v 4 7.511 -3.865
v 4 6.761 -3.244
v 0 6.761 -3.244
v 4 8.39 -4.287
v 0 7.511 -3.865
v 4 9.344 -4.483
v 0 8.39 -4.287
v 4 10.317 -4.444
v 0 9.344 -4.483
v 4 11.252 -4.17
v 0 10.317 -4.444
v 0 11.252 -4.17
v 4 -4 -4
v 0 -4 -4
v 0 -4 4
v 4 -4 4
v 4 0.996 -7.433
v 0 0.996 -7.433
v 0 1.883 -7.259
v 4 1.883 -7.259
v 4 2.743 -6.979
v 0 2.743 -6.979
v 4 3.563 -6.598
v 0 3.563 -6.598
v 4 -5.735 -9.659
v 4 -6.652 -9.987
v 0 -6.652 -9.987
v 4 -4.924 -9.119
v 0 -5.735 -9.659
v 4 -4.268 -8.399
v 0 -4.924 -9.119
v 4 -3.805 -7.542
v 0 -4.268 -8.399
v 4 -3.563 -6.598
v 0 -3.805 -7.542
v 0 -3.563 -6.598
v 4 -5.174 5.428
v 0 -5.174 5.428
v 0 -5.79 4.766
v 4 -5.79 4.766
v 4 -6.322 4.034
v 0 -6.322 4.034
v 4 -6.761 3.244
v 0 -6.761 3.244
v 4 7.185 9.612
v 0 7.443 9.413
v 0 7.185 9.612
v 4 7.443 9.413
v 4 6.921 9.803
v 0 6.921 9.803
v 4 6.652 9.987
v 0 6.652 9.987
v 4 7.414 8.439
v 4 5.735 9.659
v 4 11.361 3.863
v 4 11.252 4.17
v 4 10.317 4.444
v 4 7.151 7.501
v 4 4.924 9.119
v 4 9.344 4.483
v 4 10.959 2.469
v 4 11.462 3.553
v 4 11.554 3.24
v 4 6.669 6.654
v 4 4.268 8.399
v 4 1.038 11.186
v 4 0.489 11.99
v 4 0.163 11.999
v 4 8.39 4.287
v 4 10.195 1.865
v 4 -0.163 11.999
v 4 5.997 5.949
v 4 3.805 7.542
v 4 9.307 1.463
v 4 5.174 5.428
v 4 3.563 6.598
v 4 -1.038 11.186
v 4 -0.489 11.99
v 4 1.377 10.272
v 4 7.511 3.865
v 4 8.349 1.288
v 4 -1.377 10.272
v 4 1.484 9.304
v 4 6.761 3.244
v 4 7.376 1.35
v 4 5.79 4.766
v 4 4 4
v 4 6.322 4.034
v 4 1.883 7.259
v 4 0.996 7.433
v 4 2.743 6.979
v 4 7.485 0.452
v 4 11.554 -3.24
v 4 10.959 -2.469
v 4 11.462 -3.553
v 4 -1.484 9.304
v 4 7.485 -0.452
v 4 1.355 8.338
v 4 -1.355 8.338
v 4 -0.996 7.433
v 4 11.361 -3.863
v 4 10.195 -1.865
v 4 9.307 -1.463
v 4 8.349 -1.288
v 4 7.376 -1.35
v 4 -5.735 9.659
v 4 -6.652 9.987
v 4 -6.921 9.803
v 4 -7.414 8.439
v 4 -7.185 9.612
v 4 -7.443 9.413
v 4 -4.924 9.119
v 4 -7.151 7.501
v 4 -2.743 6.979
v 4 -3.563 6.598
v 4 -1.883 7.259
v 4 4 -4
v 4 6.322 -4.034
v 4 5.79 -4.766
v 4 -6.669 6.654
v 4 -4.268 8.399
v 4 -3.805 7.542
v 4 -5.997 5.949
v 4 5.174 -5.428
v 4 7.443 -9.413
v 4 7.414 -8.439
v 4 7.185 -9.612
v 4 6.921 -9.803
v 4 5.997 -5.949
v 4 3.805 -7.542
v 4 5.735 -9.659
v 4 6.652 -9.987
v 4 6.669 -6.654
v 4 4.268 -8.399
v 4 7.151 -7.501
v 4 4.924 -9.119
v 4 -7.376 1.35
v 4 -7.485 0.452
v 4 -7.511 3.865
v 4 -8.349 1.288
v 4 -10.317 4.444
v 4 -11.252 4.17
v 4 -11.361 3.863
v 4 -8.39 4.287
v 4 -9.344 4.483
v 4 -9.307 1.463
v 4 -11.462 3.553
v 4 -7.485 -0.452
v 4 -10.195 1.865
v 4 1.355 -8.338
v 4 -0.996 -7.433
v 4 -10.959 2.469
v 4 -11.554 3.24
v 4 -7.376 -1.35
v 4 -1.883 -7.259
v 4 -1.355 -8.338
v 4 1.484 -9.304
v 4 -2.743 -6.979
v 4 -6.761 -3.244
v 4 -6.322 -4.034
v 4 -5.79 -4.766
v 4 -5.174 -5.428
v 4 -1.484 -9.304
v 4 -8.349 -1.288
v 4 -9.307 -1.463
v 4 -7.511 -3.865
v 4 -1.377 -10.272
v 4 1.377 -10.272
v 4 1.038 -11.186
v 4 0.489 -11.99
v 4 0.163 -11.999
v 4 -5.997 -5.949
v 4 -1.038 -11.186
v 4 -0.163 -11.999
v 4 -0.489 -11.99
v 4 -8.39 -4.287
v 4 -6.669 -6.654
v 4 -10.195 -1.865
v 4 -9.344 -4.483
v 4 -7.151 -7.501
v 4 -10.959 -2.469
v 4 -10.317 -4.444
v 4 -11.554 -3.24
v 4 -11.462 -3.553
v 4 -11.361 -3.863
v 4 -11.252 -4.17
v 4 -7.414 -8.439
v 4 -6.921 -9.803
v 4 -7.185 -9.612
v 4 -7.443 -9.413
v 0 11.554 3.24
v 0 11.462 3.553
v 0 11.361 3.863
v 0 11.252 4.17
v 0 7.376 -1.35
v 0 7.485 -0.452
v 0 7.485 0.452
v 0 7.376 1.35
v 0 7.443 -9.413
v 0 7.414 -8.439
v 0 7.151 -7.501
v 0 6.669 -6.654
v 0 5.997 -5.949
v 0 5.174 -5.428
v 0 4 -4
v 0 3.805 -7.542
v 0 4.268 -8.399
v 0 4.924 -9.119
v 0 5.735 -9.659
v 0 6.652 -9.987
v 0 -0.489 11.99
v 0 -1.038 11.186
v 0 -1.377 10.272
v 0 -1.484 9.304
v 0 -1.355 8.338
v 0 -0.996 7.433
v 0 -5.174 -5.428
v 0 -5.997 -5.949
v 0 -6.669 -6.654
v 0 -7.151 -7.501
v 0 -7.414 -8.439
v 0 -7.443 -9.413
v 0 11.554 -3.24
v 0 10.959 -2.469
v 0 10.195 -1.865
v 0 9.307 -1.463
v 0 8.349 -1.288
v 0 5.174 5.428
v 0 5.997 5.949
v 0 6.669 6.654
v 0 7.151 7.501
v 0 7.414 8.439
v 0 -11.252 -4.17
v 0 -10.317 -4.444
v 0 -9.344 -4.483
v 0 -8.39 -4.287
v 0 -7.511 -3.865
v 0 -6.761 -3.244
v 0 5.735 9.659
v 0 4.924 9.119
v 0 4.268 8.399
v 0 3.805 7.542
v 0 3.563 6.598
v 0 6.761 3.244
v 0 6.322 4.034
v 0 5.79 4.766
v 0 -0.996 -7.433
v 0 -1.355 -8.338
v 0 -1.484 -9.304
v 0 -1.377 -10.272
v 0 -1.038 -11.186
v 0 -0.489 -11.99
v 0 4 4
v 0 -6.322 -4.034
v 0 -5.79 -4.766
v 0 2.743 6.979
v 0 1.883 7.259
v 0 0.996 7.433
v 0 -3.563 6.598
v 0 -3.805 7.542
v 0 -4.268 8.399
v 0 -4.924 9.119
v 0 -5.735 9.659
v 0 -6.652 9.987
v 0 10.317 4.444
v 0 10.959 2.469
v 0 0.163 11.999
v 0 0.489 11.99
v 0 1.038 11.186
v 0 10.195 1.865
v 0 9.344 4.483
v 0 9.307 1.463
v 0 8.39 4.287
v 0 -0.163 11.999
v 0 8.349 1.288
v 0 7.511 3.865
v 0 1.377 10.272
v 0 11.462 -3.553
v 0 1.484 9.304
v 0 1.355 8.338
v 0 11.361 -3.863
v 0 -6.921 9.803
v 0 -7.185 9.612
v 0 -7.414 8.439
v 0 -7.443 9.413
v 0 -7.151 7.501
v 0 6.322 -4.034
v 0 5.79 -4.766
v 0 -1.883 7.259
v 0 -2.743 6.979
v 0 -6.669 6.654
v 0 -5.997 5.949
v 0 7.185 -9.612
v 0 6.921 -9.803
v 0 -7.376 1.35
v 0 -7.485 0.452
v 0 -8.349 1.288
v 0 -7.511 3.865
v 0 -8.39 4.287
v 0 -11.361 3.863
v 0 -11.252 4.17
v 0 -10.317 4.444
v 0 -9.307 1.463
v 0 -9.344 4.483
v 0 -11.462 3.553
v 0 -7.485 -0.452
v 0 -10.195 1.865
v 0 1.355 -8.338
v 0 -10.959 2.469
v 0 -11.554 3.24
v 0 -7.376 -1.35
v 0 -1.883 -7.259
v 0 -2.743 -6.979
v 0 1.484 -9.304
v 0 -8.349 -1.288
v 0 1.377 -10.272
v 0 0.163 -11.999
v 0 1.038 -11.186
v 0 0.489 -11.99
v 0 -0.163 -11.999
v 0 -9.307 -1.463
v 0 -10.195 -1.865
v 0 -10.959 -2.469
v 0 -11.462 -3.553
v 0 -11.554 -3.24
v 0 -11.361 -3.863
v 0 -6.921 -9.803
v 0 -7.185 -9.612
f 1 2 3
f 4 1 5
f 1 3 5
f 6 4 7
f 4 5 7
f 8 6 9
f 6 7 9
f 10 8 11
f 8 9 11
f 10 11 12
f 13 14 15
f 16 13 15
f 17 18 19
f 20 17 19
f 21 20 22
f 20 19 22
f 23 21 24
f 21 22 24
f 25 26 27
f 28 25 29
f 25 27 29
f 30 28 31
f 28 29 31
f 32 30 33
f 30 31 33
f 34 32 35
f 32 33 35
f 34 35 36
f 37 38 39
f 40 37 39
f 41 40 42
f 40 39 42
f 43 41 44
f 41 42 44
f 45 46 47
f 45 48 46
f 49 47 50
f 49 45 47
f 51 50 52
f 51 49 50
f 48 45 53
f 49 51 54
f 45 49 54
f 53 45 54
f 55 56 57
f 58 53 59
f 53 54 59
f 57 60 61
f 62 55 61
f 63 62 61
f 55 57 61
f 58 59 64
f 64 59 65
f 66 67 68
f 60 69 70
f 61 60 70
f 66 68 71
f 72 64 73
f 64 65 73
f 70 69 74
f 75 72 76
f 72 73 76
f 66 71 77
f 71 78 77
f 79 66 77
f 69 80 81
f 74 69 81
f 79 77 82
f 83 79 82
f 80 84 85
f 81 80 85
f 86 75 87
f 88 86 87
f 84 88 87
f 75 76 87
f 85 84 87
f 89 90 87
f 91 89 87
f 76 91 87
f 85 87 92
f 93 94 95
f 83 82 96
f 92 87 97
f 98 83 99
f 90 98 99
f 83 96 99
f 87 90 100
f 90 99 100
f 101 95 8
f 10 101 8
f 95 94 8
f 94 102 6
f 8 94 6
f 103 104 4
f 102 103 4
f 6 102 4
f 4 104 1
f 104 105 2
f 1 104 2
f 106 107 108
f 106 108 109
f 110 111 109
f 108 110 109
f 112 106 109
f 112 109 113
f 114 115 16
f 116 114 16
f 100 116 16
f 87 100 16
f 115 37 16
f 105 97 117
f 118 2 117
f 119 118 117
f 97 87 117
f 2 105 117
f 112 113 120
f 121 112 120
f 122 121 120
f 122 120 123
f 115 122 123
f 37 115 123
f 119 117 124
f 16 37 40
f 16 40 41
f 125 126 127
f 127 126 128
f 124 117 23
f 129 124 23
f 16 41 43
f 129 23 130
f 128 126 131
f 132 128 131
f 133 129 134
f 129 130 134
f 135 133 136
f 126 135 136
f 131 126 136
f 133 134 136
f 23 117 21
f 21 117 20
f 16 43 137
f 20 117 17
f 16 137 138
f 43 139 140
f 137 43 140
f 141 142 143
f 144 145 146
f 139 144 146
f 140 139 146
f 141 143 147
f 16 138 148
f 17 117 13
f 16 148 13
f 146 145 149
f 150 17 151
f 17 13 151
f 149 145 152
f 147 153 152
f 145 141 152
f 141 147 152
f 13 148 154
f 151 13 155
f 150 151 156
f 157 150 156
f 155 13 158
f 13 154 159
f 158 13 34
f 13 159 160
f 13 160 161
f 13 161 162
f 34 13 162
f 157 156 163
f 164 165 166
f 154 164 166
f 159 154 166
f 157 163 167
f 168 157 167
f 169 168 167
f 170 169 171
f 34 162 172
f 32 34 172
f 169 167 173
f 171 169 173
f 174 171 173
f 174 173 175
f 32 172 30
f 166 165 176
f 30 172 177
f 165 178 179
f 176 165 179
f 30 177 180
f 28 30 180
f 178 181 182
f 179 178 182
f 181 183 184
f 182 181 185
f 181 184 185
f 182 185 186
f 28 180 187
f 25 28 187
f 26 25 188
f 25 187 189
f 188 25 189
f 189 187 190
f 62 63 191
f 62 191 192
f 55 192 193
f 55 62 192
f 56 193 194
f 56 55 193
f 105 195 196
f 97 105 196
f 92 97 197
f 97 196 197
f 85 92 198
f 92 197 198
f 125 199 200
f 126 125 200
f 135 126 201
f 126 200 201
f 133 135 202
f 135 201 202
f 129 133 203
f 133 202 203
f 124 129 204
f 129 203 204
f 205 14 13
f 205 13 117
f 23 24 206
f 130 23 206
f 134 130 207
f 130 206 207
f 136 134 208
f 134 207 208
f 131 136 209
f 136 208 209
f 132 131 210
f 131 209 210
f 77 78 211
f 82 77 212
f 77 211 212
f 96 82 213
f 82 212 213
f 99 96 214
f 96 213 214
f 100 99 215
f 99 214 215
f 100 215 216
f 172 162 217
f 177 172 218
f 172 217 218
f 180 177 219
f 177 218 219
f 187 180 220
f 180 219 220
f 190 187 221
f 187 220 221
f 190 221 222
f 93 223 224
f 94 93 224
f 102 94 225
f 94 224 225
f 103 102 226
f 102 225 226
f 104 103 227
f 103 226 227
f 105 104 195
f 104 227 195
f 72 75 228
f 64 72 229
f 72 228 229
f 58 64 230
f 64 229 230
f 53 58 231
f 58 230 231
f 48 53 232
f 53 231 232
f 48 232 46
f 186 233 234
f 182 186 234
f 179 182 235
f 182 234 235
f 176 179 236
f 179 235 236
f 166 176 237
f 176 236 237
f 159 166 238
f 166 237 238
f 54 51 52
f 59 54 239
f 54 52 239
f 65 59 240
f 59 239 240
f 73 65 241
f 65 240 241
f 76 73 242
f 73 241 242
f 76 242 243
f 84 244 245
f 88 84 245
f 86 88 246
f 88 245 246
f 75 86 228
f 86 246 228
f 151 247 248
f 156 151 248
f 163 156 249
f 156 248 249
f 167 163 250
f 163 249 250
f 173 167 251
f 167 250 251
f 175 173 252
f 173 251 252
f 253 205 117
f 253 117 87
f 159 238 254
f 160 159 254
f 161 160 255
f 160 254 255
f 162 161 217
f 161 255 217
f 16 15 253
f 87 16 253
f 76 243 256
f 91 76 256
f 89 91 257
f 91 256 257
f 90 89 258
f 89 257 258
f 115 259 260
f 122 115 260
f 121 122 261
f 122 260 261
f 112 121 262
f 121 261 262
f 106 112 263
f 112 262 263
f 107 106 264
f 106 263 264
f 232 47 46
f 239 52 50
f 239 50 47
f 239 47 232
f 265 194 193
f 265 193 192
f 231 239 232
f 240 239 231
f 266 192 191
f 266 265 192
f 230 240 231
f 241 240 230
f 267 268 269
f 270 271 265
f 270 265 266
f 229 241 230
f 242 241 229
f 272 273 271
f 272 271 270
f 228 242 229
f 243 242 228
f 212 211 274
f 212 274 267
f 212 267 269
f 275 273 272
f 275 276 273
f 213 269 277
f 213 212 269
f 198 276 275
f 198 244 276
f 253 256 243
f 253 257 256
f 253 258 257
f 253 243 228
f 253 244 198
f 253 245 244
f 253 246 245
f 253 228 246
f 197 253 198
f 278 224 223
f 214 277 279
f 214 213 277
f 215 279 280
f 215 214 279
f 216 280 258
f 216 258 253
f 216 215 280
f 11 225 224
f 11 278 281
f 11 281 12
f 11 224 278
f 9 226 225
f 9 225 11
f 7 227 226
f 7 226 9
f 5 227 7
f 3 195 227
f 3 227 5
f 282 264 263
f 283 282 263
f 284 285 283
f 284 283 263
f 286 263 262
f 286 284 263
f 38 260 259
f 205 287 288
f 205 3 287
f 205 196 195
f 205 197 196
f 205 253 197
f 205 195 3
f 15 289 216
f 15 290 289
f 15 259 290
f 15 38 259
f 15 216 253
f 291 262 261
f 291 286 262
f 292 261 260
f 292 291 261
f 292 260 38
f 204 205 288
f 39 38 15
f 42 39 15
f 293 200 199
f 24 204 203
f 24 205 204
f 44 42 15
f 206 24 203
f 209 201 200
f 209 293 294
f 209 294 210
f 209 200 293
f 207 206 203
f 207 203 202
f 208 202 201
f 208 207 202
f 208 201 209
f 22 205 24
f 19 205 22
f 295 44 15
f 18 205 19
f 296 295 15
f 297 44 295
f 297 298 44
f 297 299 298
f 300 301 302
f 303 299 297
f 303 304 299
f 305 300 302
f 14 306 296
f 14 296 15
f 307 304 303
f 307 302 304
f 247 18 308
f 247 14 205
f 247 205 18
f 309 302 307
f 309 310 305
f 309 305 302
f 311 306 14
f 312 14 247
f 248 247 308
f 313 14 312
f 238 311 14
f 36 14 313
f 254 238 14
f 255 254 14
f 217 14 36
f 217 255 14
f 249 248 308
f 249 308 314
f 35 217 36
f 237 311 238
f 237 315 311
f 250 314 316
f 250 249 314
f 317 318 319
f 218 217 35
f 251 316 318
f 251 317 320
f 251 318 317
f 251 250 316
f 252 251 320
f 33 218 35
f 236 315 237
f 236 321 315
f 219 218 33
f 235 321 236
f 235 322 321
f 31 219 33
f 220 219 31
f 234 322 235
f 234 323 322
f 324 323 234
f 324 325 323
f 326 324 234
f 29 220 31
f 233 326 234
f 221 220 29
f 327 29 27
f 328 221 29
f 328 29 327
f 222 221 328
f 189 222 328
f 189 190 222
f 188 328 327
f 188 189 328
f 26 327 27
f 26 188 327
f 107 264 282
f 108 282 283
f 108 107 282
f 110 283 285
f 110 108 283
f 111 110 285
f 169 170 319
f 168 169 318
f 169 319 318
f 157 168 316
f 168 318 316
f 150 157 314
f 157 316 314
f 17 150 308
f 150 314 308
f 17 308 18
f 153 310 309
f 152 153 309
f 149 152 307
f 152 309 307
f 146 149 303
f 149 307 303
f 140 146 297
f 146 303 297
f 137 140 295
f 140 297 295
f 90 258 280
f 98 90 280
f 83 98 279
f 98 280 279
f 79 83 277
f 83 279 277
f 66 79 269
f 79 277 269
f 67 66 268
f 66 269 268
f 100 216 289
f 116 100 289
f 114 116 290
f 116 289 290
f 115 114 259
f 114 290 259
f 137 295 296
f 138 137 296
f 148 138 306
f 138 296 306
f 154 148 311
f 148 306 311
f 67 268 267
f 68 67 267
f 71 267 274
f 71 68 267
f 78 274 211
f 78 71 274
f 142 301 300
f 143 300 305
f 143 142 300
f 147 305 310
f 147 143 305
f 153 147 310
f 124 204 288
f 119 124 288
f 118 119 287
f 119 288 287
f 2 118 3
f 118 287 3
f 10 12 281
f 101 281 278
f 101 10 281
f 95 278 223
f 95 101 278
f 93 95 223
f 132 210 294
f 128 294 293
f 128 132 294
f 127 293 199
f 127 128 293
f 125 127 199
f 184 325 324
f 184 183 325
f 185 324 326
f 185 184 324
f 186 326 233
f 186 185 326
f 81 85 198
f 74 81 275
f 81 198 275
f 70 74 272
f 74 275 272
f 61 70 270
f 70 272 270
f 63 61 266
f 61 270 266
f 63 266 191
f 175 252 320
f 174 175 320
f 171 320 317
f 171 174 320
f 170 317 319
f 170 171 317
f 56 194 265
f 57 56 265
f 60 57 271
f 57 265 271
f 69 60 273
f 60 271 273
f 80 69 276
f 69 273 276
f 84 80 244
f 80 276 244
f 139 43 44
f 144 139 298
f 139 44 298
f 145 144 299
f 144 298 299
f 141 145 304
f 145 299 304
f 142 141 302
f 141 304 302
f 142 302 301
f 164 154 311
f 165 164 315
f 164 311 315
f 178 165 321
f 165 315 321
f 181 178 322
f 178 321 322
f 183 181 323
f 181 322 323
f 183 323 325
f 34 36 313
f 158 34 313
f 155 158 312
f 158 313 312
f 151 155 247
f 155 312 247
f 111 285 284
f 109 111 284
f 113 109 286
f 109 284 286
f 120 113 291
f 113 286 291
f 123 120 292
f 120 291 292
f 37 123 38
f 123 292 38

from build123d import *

# Parameters (mm, degrees)
BASPROSKE_W         = 4
BASPROSKE_H         = 12
TOOTHCUT_DEPTH      = 18.435595774
TEETHCUTS_COUNT     = 10
TEETHCUTS_ANGLE     = 324
BORSKE_R            = 1
BORE_DEPTH          = 50.0000508
SKETCH_1_W          = 8
SKETCH_1_H          = 8
CUT_EXTRUDE_2_DEPTH = 18.131831434


with BuildPart() as part:
    # BasProSke → Base-Revolve (revolve)
    with BuildSketch(Plane(origin=(0, 0, 0), x_dir=(1, 0, 0), z_dir=(0, 1, 0))):
        with Locations((2, 6)):
            Rectangle(BASPROSKE_W, BASPROSKE_H)
    revolve(axis=Axis((-10, 0, 0), (1, 0, 0)))

    # TooCutSke → ToothCut (cut, through all)
    with BuildSketch(Plane(origin=(0, 0, 0), x_dir=(0, 0, -1), z_dir=(1, 0, 0))):
        with BuildLine():
            ThreePointArc((1.349961767, 7.376489967), (0, 7.499), (-1.349961767, 7.376489967))
            ThreePointArc((-1.349961767, 7.376489967), (-1.644412889, 9.779161882), (-3.270793922, 11.572041837))
            ThreePointArc((-3.270793922, 11.572041837), (0, 12.0254), (3.270793922, 11.572041837))
            ThreePointArc((3.270793922, 11.572041837), (1.644412889, 9.779161882), (1.349961767, 7.376489967))
        make_face()
    toothcut = extrude(amount=TOOTHCUT_DEPTH, mode=Mode.SUBTRACT)

    # TeethCuts: ToothCut ×10 about axis
    teethcuts_axis = Axis((-10, 0, 0), (1, 0, 0))
    for i in range(1, TEETHCUTS_COUNT):
        add(toothcut.rotate(teethcuts_axis, i * TEETHCUTS_ANGLE / (TEETHCUTS_COUNT - 1)), mode=Mode.SUBTRACT)

    # BorSke → Bore (cut, symmetric)
    with BuildSketch(Plane(origin=(0, 0, 0), x_dir=(0, 0, -1), z_dir=(1, 0, 0))):
        Circle(BORSKE_R)
    extrude(amount=BORE_DEPTH, both=True, mode=Mode.SUBTRACT)

    # 草图1 → 切除-拉伸2 (cut, through all)
    with BuildSketch(Plane.ZY):
        Rectangle(SKETCH_1_W, SKETCH_1_H)
    extrude(amount=-CUT_EXTRUDE_2_DEPTH, mode=Mode.SUBTRACT)


solid = part.part
